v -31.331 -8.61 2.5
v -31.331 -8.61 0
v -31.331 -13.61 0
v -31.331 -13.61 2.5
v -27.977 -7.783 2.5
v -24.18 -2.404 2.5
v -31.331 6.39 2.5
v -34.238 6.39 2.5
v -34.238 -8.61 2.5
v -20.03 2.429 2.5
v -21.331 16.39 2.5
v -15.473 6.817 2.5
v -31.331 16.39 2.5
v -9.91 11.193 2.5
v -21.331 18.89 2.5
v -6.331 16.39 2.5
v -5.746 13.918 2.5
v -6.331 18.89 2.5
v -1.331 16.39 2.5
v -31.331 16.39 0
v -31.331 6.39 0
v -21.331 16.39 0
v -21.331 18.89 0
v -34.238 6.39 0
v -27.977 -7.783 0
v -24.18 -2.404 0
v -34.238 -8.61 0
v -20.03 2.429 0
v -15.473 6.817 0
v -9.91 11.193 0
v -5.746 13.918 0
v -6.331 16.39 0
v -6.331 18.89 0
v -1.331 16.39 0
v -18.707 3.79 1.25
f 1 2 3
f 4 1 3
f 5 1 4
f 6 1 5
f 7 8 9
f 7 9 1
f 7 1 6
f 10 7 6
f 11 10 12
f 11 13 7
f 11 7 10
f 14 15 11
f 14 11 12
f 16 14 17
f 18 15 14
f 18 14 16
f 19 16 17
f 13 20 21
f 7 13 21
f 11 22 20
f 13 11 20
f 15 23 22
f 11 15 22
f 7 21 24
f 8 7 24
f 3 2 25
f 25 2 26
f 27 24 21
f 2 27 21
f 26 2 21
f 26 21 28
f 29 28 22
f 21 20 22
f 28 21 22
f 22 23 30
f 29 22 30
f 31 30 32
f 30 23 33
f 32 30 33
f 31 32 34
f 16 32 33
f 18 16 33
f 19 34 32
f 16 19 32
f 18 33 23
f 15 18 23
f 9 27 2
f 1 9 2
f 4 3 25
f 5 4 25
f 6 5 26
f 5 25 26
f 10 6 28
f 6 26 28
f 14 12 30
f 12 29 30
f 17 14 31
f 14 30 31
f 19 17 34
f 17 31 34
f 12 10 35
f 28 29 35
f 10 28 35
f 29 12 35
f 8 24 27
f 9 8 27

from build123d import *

# Parameters (mm, degrees)
BOSS_EXTRUDE1_DEPTH = 2.5


with BuildPart() as part:
    # Sketch1 → Boss-Extrude1 (new body)
    with BuildSketch(Plane.XY):
        with BuildLine():
            Line((-31.331144537, -8.610478528), (-31.331144537, -13.610478528))
            add(Edge.make_bspline(
                [(-31.331144537, -13.610478528), (-21.082845859, 6.19127001), (-1.331144537, 16.389521472)],
                knots=[0, 0, 0, 1, 1, 1], degree=2))
            Line((-1.331144537, 16.389521472), (-6.331144537, 16.389521472))
            Line((-6.331144537, 16.389521472), (-6.331144537, 18.889521472))
            Line((-6.331144537, 18.889521472), (-21.331144537, 18.889521472))
            Line((-21.331144537, 18.889521472), (-21.331144537, 16.389521472))
            Line((-21.331144537, 16.389521472), (-31.331144537, 16.389521472))
            Line((-31.331144537, 16.389521472), (-31.331144537, 6.389521472))
            Line((-31.331144537, 6.389521472), (-34.238029984, 6.389521472))
            Line((-34.238029984, 6.389521472), (-34.238029984, -8.610478528))
            Line((-34.238029984, -8.610478528), (-31.331144537, -8.610478528))
        make_face()
    extrude(amount=BOSS_EXTRUDE1_DEPTH)


solid = part.part
